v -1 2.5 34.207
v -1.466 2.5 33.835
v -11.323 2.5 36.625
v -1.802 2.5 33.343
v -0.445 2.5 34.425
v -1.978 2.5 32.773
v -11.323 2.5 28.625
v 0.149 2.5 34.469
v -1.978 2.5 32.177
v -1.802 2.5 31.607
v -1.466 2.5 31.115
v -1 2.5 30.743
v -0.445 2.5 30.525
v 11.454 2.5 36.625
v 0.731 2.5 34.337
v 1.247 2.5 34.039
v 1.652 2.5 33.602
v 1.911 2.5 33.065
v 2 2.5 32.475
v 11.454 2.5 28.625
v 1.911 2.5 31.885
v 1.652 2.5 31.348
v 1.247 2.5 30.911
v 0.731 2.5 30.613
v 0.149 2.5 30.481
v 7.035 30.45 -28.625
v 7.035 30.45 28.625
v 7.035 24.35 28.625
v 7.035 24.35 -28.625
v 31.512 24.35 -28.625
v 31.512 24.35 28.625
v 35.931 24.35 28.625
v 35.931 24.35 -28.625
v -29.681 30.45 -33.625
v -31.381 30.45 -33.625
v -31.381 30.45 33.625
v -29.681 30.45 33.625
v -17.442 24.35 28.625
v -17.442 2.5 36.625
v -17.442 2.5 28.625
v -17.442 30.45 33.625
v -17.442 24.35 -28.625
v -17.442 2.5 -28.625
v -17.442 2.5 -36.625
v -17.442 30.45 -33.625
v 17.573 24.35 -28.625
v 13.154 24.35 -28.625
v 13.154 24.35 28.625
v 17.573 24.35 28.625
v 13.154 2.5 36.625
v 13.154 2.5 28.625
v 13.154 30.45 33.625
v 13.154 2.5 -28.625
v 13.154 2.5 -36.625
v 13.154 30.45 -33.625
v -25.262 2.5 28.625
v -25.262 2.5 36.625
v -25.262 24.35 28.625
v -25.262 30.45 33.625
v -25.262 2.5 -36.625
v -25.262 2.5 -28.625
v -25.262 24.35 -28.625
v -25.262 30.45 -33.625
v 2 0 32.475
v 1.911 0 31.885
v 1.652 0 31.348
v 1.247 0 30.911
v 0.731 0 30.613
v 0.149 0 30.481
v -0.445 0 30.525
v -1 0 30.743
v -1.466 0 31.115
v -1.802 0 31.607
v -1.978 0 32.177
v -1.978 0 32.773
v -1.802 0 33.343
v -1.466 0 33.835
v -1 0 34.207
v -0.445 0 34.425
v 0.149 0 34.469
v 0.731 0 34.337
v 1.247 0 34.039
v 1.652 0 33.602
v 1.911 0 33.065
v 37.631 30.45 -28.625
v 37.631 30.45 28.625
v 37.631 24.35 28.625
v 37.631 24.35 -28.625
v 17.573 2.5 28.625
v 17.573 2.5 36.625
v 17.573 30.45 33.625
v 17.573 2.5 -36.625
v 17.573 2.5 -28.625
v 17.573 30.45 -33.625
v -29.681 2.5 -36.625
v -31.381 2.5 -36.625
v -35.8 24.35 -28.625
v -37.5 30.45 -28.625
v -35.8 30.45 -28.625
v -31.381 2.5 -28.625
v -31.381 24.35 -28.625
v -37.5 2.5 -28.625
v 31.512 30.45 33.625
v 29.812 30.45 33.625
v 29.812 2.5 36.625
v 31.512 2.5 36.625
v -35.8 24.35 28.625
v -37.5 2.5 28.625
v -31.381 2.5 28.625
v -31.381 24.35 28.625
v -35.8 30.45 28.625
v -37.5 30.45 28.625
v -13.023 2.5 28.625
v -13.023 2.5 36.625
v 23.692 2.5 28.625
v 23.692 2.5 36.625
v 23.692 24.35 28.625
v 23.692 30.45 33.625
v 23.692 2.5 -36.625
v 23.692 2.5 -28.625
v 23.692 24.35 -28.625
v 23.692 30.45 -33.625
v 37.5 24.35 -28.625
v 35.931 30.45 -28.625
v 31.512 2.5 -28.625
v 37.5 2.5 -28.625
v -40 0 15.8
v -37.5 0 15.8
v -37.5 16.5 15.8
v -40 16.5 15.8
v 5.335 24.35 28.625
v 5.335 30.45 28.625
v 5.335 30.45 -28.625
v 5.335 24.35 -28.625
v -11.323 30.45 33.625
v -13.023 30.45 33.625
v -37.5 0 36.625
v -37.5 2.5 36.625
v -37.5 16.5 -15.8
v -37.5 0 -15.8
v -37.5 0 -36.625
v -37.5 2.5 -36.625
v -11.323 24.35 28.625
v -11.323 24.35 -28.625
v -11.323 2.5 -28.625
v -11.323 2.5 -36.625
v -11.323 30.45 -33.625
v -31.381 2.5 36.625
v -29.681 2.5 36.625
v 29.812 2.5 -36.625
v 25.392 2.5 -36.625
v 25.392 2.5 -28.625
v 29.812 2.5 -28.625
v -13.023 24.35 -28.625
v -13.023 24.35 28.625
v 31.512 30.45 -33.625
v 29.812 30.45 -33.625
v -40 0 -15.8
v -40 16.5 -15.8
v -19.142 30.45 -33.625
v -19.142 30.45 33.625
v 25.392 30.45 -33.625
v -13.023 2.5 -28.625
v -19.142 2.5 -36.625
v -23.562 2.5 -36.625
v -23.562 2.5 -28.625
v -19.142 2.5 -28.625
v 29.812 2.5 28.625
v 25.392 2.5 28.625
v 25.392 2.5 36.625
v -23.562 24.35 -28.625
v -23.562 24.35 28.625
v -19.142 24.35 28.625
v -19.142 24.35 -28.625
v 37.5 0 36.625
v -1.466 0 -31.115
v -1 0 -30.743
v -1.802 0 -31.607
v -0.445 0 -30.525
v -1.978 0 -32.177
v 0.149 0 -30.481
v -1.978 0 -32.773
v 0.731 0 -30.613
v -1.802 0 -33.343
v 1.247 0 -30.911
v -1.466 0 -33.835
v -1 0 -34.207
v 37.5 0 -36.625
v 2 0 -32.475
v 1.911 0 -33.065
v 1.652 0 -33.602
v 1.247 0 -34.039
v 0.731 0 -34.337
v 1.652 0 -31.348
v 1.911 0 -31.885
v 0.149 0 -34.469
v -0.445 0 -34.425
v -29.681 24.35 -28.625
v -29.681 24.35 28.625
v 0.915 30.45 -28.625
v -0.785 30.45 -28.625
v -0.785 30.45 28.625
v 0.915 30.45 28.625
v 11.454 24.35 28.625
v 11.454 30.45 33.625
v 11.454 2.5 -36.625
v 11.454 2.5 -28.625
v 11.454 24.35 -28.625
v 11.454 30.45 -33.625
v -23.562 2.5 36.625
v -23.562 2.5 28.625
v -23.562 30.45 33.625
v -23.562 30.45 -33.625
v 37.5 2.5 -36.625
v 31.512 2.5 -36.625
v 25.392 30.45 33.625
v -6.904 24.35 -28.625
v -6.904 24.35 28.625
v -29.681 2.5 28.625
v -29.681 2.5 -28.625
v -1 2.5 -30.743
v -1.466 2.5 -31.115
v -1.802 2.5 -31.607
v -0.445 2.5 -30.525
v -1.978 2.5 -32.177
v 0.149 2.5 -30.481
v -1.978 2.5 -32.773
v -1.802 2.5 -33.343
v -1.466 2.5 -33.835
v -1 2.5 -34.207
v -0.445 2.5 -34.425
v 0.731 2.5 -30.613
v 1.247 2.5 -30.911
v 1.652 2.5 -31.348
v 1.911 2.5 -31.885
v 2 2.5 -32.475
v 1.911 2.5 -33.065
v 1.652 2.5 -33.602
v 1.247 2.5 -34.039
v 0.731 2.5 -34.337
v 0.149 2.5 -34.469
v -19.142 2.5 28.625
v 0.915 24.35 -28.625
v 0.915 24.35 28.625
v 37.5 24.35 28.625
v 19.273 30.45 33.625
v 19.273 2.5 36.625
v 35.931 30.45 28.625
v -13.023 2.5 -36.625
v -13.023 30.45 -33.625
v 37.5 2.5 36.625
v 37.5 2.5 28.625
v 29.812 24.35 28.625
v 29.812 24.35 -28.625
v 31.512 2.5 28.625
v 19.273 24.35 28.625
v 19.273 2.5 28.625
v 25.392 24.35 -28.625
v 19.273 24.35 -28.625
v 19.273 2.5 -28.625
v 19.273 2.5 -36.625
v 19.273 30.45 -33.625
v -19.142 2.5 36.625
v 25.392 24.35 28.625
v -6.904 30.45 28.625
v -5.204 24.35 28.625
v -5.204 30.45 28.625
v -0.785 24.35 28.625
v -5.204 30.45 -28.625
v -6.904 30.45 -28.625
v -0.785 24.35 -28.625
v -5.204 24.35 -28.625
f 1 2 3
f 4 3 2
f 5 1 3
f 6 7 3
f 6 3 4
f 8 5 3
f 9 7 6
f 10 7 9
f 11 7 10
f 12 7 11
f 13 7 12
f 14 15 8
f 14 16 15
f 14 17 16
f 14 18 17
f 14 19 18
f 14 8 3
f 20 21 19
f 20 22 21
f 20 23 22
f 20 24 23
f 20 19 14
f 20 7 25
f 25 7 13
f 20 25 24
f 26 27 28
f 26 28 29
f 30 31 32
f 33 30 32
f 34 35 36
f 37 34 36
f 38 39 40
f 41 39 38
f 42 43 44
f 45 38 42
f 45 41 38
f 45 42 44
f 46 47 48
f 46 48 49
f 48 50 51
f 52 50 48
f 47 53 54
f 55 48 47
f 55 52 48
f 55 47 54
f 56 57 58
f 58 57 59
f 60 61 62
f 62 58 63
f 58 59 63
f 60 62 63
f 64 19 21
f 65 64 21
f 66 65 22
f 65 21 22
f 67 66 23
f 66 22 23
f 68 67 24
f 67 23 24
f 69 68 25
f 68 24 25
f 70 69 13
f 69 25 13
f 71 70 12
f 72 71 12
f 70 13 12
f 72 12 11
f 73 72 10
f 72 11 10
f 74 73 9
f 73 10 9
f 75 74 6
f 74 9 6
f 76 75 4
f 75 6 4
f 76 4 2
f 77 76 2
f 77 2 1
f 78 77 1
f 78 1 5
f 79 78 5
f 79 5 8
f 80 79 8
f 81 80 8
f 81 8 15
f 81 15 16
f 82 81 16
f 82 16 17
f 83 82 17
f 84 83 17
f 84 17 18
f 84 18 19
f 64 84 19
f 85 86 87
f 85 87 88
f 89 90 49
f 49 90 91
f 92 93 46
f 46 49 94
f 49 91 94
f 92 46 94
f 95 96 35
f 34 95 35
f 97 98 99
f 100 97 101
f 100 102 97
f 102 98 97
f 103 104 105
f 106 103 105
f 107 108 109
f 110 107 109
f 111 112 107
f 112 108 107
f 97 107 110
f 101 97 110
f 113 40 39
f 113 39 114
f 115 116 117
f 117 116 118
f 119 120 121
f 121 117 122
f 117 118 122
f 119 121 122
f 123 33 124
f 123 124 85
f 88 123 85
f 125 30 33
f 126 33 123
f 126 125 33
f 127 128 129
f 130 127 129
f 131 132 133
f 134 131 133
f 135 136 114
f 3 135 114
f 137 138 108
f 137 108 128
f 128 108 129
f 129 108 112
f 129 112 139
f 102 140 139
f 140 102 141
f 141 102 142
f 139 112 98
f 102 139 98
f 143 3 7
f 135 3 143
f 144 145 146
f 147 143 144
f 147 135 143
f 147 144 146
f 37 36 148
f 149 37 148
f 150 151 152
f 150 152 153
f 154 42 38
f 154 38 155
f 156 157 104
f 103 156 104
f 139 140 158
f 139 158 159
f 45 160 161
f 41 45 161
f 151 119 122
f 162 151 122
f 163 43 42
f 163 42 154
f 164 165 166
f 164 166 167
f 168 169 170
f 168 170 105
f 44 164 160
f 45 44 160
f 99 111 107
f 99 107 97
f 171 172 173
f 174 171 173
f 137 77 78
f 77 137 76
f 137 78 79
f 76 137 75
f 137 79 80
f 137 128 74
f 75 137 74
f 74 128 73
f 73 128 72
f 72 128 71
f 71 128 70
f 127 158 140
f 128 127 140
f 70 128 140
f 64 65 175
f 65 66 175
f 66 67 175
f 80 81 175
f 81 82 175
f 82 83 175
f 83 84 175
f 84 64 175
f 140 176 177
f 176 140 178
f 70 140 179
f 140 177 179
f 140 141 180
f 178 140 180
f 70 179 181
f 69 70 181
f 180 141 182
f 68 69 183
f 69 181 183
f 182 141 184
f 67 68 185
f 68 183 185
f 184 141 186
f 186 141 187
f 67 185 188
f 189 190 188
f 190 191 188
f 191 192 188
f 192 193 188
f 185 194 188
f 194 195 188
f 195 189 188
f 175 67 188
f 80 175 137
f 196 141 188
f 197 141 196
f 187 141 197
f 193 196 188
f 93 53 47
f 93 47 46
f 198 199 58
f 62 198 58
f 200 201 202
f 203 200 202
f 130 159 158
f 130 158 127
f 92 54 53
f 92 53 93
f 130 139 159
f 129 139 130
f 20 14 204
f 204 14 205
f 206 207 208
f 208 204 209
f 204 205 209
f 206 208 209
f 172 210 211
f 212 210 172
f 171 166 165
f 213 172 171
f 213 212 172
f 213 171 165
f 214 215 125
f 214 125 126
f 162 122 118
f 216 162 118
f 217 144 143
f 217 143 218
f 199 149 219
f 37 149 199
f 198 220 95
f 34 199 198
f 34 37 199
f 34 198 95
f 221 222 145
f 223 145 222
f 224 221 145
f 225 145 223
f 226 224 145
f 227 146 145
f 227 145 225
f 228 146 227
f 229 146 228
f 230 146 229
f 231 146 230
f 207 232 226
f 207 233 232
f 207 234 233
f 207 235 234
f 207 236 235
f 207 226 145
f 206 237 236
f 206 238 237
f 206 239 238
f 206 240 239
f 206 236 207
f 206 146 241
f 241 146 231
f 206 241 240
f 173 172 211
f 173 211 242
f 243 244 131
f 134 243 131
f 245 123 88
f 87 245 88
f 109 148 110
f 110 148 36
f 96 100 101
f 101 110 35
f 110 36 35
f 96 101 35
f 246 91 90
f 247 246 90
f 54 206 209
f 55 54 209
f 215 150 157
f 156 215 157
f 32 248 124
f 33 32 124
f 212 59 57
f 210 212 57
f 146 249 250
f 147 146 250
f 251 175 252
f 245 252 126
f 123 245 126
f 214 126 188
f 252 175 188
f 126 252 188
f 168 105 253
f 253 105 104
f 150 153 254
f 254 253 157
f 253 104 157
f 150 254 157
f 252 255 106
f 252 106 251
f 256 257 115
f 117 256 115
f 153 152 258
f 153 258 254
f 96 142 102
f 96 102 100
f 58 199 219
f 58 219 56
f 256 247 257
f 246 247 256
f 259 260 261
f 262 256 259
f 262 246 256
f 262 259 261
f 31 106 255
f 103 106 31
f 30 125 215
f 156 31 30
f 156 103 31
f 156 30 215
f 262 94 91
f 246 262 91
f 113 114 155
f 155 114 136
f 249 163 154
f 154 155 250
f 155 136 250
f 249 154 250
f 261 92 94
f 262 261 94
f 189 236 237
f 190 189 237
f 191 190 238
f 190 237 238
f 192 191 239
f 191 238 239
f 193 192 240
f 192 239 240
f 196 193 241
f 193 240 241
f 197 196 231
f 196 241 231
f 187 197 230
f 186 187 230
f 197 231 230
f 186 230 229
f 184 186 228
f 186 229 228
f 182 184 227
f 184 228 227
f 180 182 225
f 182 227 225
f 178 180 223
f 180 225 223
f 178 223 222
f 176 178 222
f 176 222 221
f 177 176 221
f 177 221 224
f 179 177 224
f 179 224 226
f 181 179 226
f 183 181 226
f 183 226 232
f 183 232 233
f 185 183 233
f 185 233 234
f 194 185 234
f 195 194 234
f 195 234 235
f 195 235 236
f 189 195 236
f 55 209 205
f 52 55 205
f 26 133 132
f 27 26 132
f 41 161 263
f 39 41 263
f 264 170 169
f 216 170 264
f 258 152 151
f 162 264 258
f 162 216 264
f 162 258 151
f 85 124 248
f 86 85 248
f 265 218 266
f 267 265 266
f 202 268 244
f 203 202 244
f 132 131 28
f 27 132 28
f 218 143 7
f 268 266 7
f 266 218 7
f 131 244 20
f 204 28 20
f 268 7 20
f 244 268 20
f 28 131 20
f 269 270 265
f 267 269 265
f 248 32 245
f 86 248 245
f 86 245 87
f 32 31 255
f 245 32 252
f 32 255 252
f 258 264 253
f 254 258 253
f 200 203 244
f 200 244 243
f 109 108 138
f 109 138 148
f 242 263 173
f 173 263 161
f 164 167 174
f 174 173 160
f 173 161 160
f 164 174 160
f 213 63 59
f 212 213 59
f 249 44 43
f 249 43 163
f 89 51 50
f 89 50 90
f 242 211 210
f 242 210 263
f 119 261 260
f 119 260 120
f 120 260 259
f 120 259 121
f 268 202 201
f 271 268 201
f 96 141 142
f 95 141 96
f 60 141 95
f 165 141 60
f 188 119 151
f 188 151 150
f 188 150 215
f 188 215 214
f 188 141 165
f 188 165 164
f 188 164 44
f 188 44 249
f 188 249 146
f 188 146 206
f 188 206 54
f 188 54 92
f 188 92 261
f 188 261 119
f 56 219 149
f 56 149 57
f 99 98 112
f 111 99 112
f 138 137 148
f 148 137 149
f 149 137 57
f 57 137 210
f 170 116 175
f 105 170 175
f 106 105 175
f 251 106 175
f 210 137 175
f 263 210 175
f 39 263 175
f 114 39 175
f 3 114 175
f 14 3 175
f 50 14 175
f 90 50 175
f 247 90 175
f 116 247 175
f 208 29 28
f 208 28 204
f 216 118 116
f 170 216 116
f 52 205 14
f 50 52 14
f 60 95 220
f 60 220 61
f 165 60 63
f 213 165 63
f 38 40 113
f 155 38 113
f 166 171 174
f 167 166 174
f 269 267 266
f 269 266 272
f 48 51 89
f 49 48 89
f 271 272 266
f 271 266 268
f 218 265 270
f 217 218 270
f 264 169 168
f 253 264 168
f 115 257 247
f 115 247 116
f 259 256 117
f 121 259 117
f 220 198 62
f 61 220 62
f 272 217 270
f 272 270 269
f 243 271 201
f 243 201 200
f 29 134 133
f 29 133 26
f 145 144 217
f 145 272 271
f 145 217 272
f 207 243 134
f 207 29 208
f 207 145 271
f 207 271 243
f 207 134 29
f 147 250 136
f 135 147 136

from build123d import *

# Parameters (mm, degrees)
SKETCH1_W                      = 75
SKETCH1_H                      = 73.25
BOSS_EXTRUDE1_DEPTH            = 2.5
SKETCH2_W                      = 75
SKETCH2_H                      = 57.25
BOSS_EXTRUDE2_DEPTH            = 21.85
BOSS_EXTRUDE3_DEPTH            = 1.7
LPATTERN1_COUNT                = 13
LPATTERN1_PITCH                = 6.119230769
CUT_EXTRUDE1_REACH             = 26.35
SKETCH4_W                      = 1.7
SKETCH4_H                      = 8
CUT_EXTRUDE1_DIRECTION_2_REACH = 8.1
SKETCH5_R                      = 2
CUT_EXTRUDE2_DEPTH             = 3.5
SKETCH6_W                      = 31.6
SKETCH6_H                      = 16.5
BOSS_EXTRUDE4_DEPTH            = 2.5


with BuildPart() as part:
    # Sketch1 → Boss-Extrude1 (new body)
    with BuildSketch(Plane(origin=(0, 0, 0), x_dir=(1, 0, 0), z_dir=(0, 1, 0))):
        Rectangle(SKETCH1_W, SKETCH1_H)
    extrude(amount=BOSS_EXTRUDE1_DEPTH)

    # Sketch2 → Boss-Extrude2 (add)
    with BuildSketch(Plane(origin=(0, 2.5, 0), x_dir=(1, 0, 0), z_dir=(0, 1, 0))):
        Rectangle(SKETCH2_W, SKETCH2_H)
    extrude(amount=BOSS_EXTRUDE2_DEPTH)

    # Sketch3 → Boss-Extrude3 (add)
    with BuildSketch(Plane.ZY.offset(37.5)):
        Polygon((-33.625, 30.45), (33.625, 30.45), (36.625, 2.5), (28.625, 2.5), (28.625, 24.35), (-28.625, 24.35), (-28.625, 2.5), (-36.625, 2.5), align=None)
    boss_extrude3 = extrude(amount=-BOSS_EXTRUDE3_DEPTH)

    # LPattern1: Boss-Extrude3 ×13
    with Locations(*[(i * LPATTERN1_PITCH, 0, 0) for i in range(1, LPATTERN1_COUNT)]):
        add(boss_extrude3)

    # Cut-Extrude1: up to this face of the body (flat: up to its plane)
    cut_extrude1_end = Plane(part.part.faces().sort_by_distance((33.721153846, 2.5, -32.625))[0])
    # Sketch4 → Cut-Extrude1 (cut, up to the picked face)
    with BuildSketch(Plane(origin=(0, 24.35, 0), x_dir=(1, 0, 0), z_dir=(0, 1, 0)), mode=Mode.PRIVATE) as cut_extrude1_sk1:
        with Locations((-36.65, -32.625)):
            Rectangle(SKETCH4_W, SKETCH4_H)
    cut_extrude1_tool1 = split(extrude(cut_extrude1_sk1.sketch, amount=-CUT_EXTRUDE1_REACH, mode=Mode.PRIVATE), bisect_by=cut_extrude1_end, keep=Keep.BOTH, mode=Mode.PRIVATE)
    add(cut_extrude1_tool1.solids().sort_by_distance((-36.65, 24.35, 32.625))[0], mode=Mode.SUBTRACT)
    # Sketch4 → Cut-Extrude1 (cut, up to the picked face)
    with BuildSketch(Plane(origin=(0, 24.35, 0), x_dir=(1, 0, 0), z_dir=(0, 1, 0)), mode=Mode.PRIVATE) as cut_extrude1_sk2:
        with Locations((-6.053846154, -32.625)):
            Rectangle(SKETCH4_W, SKETCH4_H)
    cut_extrude1_tool2 = split(extrude(cut_extrude1_sk2.sketch, amount=-CUT_EXTRUDE1_REACH, mode=Mode.PRIVATE), bisect_by=cut_extrude1_end, keep=Keep.BOTH, mode=Mode.PRIVATE)
    add(cut_extrude1_tool2.solids().sort_by_distance((-6.053846, 24.35, 32.625))[0], mode=Mode.SUBTRACT)
    # Sketch4 → Cut-Extrude1 (cut, up to the picked face)
    with BuildSketch(Plane(origin=(0, 24.35, 0), x_dir=(1, 0, 0), z_dir=(0, 1, 0)), mode=Mode.PRIVATE) as cut_extrude1_sk3:
        with Locations((0.065384615, -32.625)):
            Rectangle(SKETCH4_W, SKETCH4_H)
    cut_extrude1_tool3 = split(extrude(cut_extrude1_sk3.sketch, amount=-CUT_EXTRUDE1_REACH, mode=Mode.PRIVATE), bisect_by=cut_extrude1_end, keep=Keep.BOTH, mode=Mode.PRIVATE)
    add(cut_extrude1_tool3.solids().sort_by_distance((0.065385, 24.35, 32.625))[0], mode=Mode.SUBTRACT)
    # Sketch4 → Cut-Extrude1 (cut, up to the picked face)
    with BuildSketch(Plane(origin=(0, 24.35, 0), x_dir=(1, 0, 0), z_dir=(0, 1, 0)), mode=Mode.PRIVATE) as cut_extrude1_sk4:
        with Locations((6.184615385, -32.625)):
            Rectangle(SKETCH4_W, SKETCH4_H)
    cut_extrude1_tool4 = split(extrude(cut_extrude1_sk4.sketch, amount=-CUT_EXTRUDE1_REACH, mode=Mode.PRIVATE), bisect_by=cut_extrude1_end, keep=Keep.BOTH, mode=Mode.PRIVATE)
    add(cut_extrude1_tool4.solids().sort_by_distance((6.184615, 24.35, 32.625))[0], mode=Mode.SUBTRACT)
    # Sketch4 → Cut-Extrude1 (cut, up to the picked face)
    with BuildSketch(Plane(origin=(0, 24.35, 0), x_dir=(1, 0, 0), z_dir=(0, 1, 0)), mode=Mode.PRIVATE) as cut_extrude1_sk5:
        with Locations((36.780769231, -32.625)):
            Rectangle(SKETCH4_W, SKETCH4_H)
    cut_extrude1_tool5 = split(extrude(cut_extrude1_sk5.sketch, amount=-CUT_EXTRUDE1_REACH, mode=Mode.PRIVATE), bisect_by=cut_extrude1_end, keep=Keep.BOTH, mode=Mode.PRIVATE)
    add(cut_extrude1_tool5.solids().sort_by_distance((36.780769, 24.35, 32.625))[0], mode=Mode.SUBTRACT)
    # Sketch4 → Cut-Extrude1 (cut, up to the picked face)
    with BuildSketch(Plane(origin=(0, 24.35, 0), x_dir=(1, 0, 0), z_dir=(0, 1, 0)), mode=Mode.PRIVATE) as cut_extrude1_sk6:
        with Locations((-36.65, 32.625)):
            Rectangle(SKETCH4_W, SKETCH4_H)
    cut_extrude1_tool6 = split(extrude(cut_extrude1_sk6.sketch, amount=-CUT_EXTRUDE1_REACH, mode=Mode.PRIVATE), bisect_by=cut_extrude1_end, keep=Keep.BOTH, mode=Mode.PRIVATE)
    add(cut_extrude1_tool6.solids().sort_by_distance((-36.65, 24.35, -32.625))[0], mode=Mode.SUBTRACT)
    # Sketch4 → Cut-Extrude1 (cut, up to the picked face)
    with BuildSketch(Plane(origin=(0, 24.35, 0), x_dir=(1, 0, 0), z_dir=(0, 1, 0)), mode=Mode.PRIVATE) as cut_extrude1_sk7:
        with Locations((-6.053846154, 32.625)):
            Rectangle(SKETCH4_W, SKETCH4_H)
    cut_extrude1_tool7 = split(extrude(cut_extrude1_sk7.sketch, amount=-CUT_EXTRUDE1_REACH, mode=Mode.PRIVATE), bisect_by=cut_extrude1_end, keep=Keep.BOTH, mode=Mode.PRIVATE)
    add(cut_extrude1_tool7.solids().sort_by_distance((-6.053846, 24.35, -32.625))[0], mode=Mode.SUBTRACT)
    # Sketch4 → Cut-Extrude1 (cut, up to the picked face)
    with BuildSketch(Plane(origin=(0, 24.35, 0), x_dir=(1, 0, 0), z_dir=(0, 1, 0)), mode=Mode.PRIVATE) as cut_extrude1_sk8:
        with Locations((6.184615385, 32.625)):
            Rectangle(SKETCH4_W, SKETCH4_H)
    cut_extrude1_tool8 = split(extrude(cut_extrude1_sk8.sketch, amount=-CUT_EXTRUDE1_REACH, mode=Mode.PRIVATE), bisect_by=cut_extrude1_end, keep=Keep.BOTH, mode=Mode.PRIVATE)
    add(cut_extrude1_tool8.solids().sort_by_distance((6.184615, 24.35, -32.625))[0], mode=Mode.SUBTRACT)
    # Sketch4 → Cut-Extrude1 (cut, up to the picked face)
    with BuildSketch(Plane(origin=(0, 24.35, 0), x_dir=(1, 0, 0), z_dir=(0, 1, 0)), mode=Mode.PRIVATE) as cut_extrude1_sk9:
        with Locations((36.780769231, 32.625)):
            Rectangle(SKETCH4_W, SKETCH4_H)
    cut_extrude1_tool9 = split(extrude(cut_extrude1_sk9.sketch, amount=-CUT_EXTRUDE1_REACH, mode=Mode.PRIVATE), bisect_by=cut_extrude1_end, keep=Keep.BOTH, mode=Mode.PRIVATE)
    add(cut_extrude1_tool9.solids().sort_by_distance((36.780769, 24.35, -32.625))[0], mode=Mode.SUBTRACT)
    # Sketch4 → Cut-Extrude1 (cut, up to the picked face)
    with BuildSketch(Plane(origin=(0, 24.35, 0), x_dir=(1, 0, 0), z_dir=(0, 1, 0)), mode=Mode.PRIVATE) as cut_extrude1_sk10:
        with Locations((0.065384615, 32.625)):
            Rectangle(SKETCH4_W, SKETCH4_H)
    cut_extrude1_tool10 = split(extrude(cut_extrude1_sk10.sketch, amount=-CUT_EXTRUDE1_REACH, mode=Mode.PRIVATE), bisect_by=cut_extrude1_end, keep=Keep.BOTH, mode=Mode.PRIVATE)
    add(cut_extrude1_tool10.solids().sort_by_distance((0.065385, 24.35, -32.625))[0], mode=Mode.SUBTRACT)

    # Cut-Extrude1 direction 2: up to this face of the body (flat: up to its plane)
    cut_extrude1_direction_2_end = Plane(part.part.faces().sort_by_distance((36.780769231, 30.45, 0))[0])
    # Sketch4 → Cut-Extrude1 direction 2 (cut, up to the picked face)
    with BuildSketch(Plane(origin=(0, 24.35, 0), x_dir=(1, 0, 0), z_dir=(0, 1, 0)), mode=Mode.PRIVATE) as cut_extrude1_direction_2_sk1:
        with Locations((-36.65, -32.625)):
            Rectangle(SKETCH4_W, SKETCH4_H)
    cut_extrude1_direction_2_tool1 = split(extrude(cut_extrude1_direction_2_sk1.sketch, amount=CUT_EXTRUDE1_DIRECTION_2_REACH, mode=Mode.PRIVATE), bisect_by=cut_extrude1_direction_2_end, keep=Keep.BOTH, mode=Mode.PRIVATE)
    add(cut_extrude1_direction_2_tool1.solids().sort_by_distance((-36.65, 24.35, 32.625))[0], mode=Mode.SUBTRACT)
    # Sketch4 → Cut-Extrude1 direction 2 (cut, up to the picked face)
    with BuildSketch(Plane(origin=(0, 24.35, 0), x_dir=(1, 0, 0), z_dir=(0, 1, 0)), mode=Mode.PRIVATE) as cut_extrude1_direction_2_sk2:
        with Locations((-6.053846154, -32.625)):
            Rectangle(SKETCH4_W, SKETCH4_H)
    cut_extrude1_direction_2_tool2 = split(extrude(cut_extrude1_direction_2_sk2.sketch, amount=CUT_EXTRUDE1_DIRECTION_2_REACH, mode=Mode.PRIVATE), bisect_by=cut_extrude1_direction_2_end, keep=Keep.BOTH, mode=Mode.PRIVATE)
    add(cut_extrude1_direction_2_tool2.solids().sort_by_distance((-6.053846, 24.35, 32.625))[0], mode=Mode.SUBTRACT)
    # Sketch4 → Cut-Extrude1 direction 2 (cut, up to the picked face)
    with BuildSketch(Plane(origin=(0, 24.35, 0), x_dir=(1, 0, 0), z_dir=(0, 1, 0)), mode=Mode.PRIVATE) as cut_extrude1_direction_2_sk3:
        with Locations((0.065384615, -32.625)):
            Rectangle(SKETCH4_W, SKETCH4_H)
    cut_extrude1_direction_2_tool3 = split(extrude(cut_extrude1_direction_2_sk3.sketch, amount=CUT_EXTRUDE1_DIRECTION_2_REACH, mode=Mode.PRIVATE), bisect_by=cut_extrude1_direction_2_end, keep=Keep.BOTH, mode=Mode.PRIVATE)
    add(cut_extrude1_direction_2_tool3.solids().sort_by_distance((0.065385, 24.35, 32.625))[0], mode=Mode.SUBTRACT)
    # Sketch4 → Cut-Extrude1 direction 2 (cut, up to the picked face)
    with BuildSketch(Plane(origin=(0, 24.35, 0), x_dir=(1, 0, 0), z_dir=(0, 1, 0)), mode=Mode.PRIVATE) as cut_extrude1_direction_2_sk4:
        with Locations((6.184615385, -32.625)):
            Rectangle(SKETCH4_W, SKETCH4_H)
    cut_extrude1_direction_2_tool4 = split(extrude(cut_extrude1_direction_2_sk4.sketch, amount=CUT_EXTRUDE1_DIRECTION_2_REACH, mode=Mode.PRIVATE), bisect_by=cut_extrude1_direction_2_end, keep=Keep.BOTH, mode=Mode.PRIVATE)
    add(cut_extrude1_direction_2_tool4.solids().sort_by_distance((6.184615, 24.35, 32.625))[0], mode=Mode.SUBTRACT)
    # Sketch4 → Cut-Extrude1 direction 2 (cut, up to the picked face)
    with BuildSketch(Plane(origin=(0, 24.35, 0), x_dir=(1, 0, 0), z_dir=(0, 1, 0)), mode=Mode.PRIVATE) as cut_extrude1_direction_2_sk5:
        with Locations((36.780769231, -32.625)):
            Rectangle(SKETCH4_W, SKETCH4_H)
    cut_extrude1_direction_2_tool5 = split(extrude(cut_extrude1_direction_2_sk5.sketch, amount=CUT_EXTRUDE1_DIRECTION_2_REACH, mode=Mode.PRIVATE), bisect_by=cut_extrude1_direction_2_end, keep=Keep.BOTH, mode=Mode.PRIVATE)
    add(cut_extrude1_direction_2_tool5.solids().sort_by_distance((36.780769, 24.35, 32.625))[0], mode=Mode.SUBTRACT)
    # Sketch4 → Cut-Extrude1 direction 2 (cut, up to the picked face)
    with BuildSketch(Plane(origin=(0, 24.35, 0), x_dir=(1, 0, 0), z_dir=(0, 1, 0)), mode=Mode.PRIVATE) as cut_extrude1_direction_2_sk6:
        with Locations((-36.65, 32.625)):
            Rectangle(SKETCH4_W, SKETCH4_H)
    cut_extrude1_direction_2_tool6 = split(extrude(cut_extrude1_direction_2_sk6.sketch, amount=CUT_EXTRUDE1_DIRECTION_2_REACH, mode=Mode.PRIVATE), bisect_by=cut_extrude1_direction_2_end, keep=Keep.BOTH, mode=Mode.PRIVATE)
    add(cut_extrude1_direction_2_tool6.solids().sort_by_distance((-36.65, 24.35, -32.625))[0], mode=Mode.SUBTRACT)
    # Sketch4 → Cut-Extrude1 direction 2 (cut, up to the picked face)
    with BuildSketch(Plane(origin=(0, 24.35, 0), x_dir=(1, 0, 0), z_dir=(0, 1, 0)), mode=Mode.PRIVATE) as cut_extrude1_direction_2_sk7:
        with Locations((-6.053846154, 32.625)):
            Rectangle(SKETCH4_W, SKETCH4_H)
    cut_extrude1_direction_2_tool7 = split(extrude(cut_extrude1_direction_2_sk7.sketch, amount=CUT_EXTRUDE1_DIRECTION_2_REACH, mode=Mode.PRIVATE), bisect_by=cut_extrude1_direction_2_end, keep=Keep.BOTH, mode=Mode.PRIVATE)
    add(cut_extrude1_direction_2_tool7.solids().sort_by_distance((-6.053846, 24.35, -32.625))[0], mode=Mode.SUBTRACT)
    # Sketch4 → Cut-Extrude1 direction 2 (cut, up to the picked face)
    with BuildSketch(Plane(origin=(0, 24.35, 0), x_dir=(1, 0, 0), z_dir=(0, 1, 0)), mode=Mode.PRIVATE) as cut_extrude1_direction_2_sk8:
        with Locations((6.184615385, 32.625)):
            Rectangle(SKETCH4_W, SKETCH4_H)
    cut_extrude1_direction_2_tool8 = split(extrude(cut_extrude1_direction_2_sk8.sketch, amount=CUT_EXTRUDE1_DIRECTION_2_REACH, mode=Mode.PRIVATE), bisect_by=cut_extrude1_direction_2_end, keep=Keep.BOTH, mode=Mode.PRIVATE)
    add(cut_extrude1_direction_2_tool8.solids().sort_by_distance((6.184615, 24.35, -32.625))[0], mode=Mode.SUBTRACT)
    # Sketch4 → Cut-Extrude1 direction 2 (cut, up to the picked face)
    with BuildSketch(Plane(origin=(0, 24.35, 0), x_dir=(1, 0, 0), z_dir=(0, 1, 0)), mode=Mode.PRIVATE) as cut_extrude1_direction_2_sk9:
        with Locations((36.780769231, 32.625)):
            Rectangle(SKETCH4_W, SKETCH4_H)
    cut_extrude1_direction_2_tool9 = split(extrude(cut_extrude1_direction_2_sk9.sketch, amount=CUT_EXTRUDE1_DIRECTION_2_REACH, mode=Mode.PRIVATE), bisect_by=cut_extrude1_direction_2_end, keep=Keep.BOTH, mode=Mode.PRIVATE)
    add(cut_extrude1_direction_2_tool9.solids().sort_by_distance((36.780769, 24.35, -32.625))[0], mode=Mode.SUBTRACT)
    # Sketch4 → Cut-Extrude1 direction 2 (cut, up to the picked face)
    with BuildSketch(Plane(origin=(0, 24.35, 0), x_dir=(1, 0, 0), z_dir=(0, 1, 0)), mode=Mode.PRIVATE) as cut_extrude1_direction_2_sk10:
        with Locations((0.065384615, 32.625)):
            Rectangle(SKETCH4_W, SKETCH4_H)
    cut_extrude1_direction_2_tool10 = split(extrude(cut_extrude1_direction_2_sk10.sketch, amount=CUT_EXTRUDE1_DIRECTION_2_REACH, mode=Mode.PRIVATE), bisect_by=cut_extrude1_direction_2_end, keep=Keep.BOTH, mode=Mode.PRIVATE)
    add(cut_extrude1_direction_2_tool10.solids().sort_by_distance((0.065385, 24.35, -32.625))[0], mode=Mode.SUBTRACT)

    # Sketch5 → Cut-Extrude2 (cut, through all)
    with BuildSketch(Plane(origin=(0, 2.5, 0), x_dir=(1, 0, 0), z_dir=(0, 1, 0))):
        with Locations((0, 32.475)):
            Circle(SKETCH5_R)
        with Locations((0, -32.475)):
            Circle(SKETCH5_R)
    extrude(amount=-CUT_EXTRUDE2_DEPTH, mode=Mode.SUBTRACT)

    # Sketch6 → Boss-Extrude4 (add)
    with BuildSketch(Plane.ZY.offset(37.5)):
        with Locations((0, 8.25)):
            Rectangle(SKETCH6_W, SKETCH6_H)
    extrude(amount=BOSS_EXTRUDE4_DEPTH)


solid = part.part
